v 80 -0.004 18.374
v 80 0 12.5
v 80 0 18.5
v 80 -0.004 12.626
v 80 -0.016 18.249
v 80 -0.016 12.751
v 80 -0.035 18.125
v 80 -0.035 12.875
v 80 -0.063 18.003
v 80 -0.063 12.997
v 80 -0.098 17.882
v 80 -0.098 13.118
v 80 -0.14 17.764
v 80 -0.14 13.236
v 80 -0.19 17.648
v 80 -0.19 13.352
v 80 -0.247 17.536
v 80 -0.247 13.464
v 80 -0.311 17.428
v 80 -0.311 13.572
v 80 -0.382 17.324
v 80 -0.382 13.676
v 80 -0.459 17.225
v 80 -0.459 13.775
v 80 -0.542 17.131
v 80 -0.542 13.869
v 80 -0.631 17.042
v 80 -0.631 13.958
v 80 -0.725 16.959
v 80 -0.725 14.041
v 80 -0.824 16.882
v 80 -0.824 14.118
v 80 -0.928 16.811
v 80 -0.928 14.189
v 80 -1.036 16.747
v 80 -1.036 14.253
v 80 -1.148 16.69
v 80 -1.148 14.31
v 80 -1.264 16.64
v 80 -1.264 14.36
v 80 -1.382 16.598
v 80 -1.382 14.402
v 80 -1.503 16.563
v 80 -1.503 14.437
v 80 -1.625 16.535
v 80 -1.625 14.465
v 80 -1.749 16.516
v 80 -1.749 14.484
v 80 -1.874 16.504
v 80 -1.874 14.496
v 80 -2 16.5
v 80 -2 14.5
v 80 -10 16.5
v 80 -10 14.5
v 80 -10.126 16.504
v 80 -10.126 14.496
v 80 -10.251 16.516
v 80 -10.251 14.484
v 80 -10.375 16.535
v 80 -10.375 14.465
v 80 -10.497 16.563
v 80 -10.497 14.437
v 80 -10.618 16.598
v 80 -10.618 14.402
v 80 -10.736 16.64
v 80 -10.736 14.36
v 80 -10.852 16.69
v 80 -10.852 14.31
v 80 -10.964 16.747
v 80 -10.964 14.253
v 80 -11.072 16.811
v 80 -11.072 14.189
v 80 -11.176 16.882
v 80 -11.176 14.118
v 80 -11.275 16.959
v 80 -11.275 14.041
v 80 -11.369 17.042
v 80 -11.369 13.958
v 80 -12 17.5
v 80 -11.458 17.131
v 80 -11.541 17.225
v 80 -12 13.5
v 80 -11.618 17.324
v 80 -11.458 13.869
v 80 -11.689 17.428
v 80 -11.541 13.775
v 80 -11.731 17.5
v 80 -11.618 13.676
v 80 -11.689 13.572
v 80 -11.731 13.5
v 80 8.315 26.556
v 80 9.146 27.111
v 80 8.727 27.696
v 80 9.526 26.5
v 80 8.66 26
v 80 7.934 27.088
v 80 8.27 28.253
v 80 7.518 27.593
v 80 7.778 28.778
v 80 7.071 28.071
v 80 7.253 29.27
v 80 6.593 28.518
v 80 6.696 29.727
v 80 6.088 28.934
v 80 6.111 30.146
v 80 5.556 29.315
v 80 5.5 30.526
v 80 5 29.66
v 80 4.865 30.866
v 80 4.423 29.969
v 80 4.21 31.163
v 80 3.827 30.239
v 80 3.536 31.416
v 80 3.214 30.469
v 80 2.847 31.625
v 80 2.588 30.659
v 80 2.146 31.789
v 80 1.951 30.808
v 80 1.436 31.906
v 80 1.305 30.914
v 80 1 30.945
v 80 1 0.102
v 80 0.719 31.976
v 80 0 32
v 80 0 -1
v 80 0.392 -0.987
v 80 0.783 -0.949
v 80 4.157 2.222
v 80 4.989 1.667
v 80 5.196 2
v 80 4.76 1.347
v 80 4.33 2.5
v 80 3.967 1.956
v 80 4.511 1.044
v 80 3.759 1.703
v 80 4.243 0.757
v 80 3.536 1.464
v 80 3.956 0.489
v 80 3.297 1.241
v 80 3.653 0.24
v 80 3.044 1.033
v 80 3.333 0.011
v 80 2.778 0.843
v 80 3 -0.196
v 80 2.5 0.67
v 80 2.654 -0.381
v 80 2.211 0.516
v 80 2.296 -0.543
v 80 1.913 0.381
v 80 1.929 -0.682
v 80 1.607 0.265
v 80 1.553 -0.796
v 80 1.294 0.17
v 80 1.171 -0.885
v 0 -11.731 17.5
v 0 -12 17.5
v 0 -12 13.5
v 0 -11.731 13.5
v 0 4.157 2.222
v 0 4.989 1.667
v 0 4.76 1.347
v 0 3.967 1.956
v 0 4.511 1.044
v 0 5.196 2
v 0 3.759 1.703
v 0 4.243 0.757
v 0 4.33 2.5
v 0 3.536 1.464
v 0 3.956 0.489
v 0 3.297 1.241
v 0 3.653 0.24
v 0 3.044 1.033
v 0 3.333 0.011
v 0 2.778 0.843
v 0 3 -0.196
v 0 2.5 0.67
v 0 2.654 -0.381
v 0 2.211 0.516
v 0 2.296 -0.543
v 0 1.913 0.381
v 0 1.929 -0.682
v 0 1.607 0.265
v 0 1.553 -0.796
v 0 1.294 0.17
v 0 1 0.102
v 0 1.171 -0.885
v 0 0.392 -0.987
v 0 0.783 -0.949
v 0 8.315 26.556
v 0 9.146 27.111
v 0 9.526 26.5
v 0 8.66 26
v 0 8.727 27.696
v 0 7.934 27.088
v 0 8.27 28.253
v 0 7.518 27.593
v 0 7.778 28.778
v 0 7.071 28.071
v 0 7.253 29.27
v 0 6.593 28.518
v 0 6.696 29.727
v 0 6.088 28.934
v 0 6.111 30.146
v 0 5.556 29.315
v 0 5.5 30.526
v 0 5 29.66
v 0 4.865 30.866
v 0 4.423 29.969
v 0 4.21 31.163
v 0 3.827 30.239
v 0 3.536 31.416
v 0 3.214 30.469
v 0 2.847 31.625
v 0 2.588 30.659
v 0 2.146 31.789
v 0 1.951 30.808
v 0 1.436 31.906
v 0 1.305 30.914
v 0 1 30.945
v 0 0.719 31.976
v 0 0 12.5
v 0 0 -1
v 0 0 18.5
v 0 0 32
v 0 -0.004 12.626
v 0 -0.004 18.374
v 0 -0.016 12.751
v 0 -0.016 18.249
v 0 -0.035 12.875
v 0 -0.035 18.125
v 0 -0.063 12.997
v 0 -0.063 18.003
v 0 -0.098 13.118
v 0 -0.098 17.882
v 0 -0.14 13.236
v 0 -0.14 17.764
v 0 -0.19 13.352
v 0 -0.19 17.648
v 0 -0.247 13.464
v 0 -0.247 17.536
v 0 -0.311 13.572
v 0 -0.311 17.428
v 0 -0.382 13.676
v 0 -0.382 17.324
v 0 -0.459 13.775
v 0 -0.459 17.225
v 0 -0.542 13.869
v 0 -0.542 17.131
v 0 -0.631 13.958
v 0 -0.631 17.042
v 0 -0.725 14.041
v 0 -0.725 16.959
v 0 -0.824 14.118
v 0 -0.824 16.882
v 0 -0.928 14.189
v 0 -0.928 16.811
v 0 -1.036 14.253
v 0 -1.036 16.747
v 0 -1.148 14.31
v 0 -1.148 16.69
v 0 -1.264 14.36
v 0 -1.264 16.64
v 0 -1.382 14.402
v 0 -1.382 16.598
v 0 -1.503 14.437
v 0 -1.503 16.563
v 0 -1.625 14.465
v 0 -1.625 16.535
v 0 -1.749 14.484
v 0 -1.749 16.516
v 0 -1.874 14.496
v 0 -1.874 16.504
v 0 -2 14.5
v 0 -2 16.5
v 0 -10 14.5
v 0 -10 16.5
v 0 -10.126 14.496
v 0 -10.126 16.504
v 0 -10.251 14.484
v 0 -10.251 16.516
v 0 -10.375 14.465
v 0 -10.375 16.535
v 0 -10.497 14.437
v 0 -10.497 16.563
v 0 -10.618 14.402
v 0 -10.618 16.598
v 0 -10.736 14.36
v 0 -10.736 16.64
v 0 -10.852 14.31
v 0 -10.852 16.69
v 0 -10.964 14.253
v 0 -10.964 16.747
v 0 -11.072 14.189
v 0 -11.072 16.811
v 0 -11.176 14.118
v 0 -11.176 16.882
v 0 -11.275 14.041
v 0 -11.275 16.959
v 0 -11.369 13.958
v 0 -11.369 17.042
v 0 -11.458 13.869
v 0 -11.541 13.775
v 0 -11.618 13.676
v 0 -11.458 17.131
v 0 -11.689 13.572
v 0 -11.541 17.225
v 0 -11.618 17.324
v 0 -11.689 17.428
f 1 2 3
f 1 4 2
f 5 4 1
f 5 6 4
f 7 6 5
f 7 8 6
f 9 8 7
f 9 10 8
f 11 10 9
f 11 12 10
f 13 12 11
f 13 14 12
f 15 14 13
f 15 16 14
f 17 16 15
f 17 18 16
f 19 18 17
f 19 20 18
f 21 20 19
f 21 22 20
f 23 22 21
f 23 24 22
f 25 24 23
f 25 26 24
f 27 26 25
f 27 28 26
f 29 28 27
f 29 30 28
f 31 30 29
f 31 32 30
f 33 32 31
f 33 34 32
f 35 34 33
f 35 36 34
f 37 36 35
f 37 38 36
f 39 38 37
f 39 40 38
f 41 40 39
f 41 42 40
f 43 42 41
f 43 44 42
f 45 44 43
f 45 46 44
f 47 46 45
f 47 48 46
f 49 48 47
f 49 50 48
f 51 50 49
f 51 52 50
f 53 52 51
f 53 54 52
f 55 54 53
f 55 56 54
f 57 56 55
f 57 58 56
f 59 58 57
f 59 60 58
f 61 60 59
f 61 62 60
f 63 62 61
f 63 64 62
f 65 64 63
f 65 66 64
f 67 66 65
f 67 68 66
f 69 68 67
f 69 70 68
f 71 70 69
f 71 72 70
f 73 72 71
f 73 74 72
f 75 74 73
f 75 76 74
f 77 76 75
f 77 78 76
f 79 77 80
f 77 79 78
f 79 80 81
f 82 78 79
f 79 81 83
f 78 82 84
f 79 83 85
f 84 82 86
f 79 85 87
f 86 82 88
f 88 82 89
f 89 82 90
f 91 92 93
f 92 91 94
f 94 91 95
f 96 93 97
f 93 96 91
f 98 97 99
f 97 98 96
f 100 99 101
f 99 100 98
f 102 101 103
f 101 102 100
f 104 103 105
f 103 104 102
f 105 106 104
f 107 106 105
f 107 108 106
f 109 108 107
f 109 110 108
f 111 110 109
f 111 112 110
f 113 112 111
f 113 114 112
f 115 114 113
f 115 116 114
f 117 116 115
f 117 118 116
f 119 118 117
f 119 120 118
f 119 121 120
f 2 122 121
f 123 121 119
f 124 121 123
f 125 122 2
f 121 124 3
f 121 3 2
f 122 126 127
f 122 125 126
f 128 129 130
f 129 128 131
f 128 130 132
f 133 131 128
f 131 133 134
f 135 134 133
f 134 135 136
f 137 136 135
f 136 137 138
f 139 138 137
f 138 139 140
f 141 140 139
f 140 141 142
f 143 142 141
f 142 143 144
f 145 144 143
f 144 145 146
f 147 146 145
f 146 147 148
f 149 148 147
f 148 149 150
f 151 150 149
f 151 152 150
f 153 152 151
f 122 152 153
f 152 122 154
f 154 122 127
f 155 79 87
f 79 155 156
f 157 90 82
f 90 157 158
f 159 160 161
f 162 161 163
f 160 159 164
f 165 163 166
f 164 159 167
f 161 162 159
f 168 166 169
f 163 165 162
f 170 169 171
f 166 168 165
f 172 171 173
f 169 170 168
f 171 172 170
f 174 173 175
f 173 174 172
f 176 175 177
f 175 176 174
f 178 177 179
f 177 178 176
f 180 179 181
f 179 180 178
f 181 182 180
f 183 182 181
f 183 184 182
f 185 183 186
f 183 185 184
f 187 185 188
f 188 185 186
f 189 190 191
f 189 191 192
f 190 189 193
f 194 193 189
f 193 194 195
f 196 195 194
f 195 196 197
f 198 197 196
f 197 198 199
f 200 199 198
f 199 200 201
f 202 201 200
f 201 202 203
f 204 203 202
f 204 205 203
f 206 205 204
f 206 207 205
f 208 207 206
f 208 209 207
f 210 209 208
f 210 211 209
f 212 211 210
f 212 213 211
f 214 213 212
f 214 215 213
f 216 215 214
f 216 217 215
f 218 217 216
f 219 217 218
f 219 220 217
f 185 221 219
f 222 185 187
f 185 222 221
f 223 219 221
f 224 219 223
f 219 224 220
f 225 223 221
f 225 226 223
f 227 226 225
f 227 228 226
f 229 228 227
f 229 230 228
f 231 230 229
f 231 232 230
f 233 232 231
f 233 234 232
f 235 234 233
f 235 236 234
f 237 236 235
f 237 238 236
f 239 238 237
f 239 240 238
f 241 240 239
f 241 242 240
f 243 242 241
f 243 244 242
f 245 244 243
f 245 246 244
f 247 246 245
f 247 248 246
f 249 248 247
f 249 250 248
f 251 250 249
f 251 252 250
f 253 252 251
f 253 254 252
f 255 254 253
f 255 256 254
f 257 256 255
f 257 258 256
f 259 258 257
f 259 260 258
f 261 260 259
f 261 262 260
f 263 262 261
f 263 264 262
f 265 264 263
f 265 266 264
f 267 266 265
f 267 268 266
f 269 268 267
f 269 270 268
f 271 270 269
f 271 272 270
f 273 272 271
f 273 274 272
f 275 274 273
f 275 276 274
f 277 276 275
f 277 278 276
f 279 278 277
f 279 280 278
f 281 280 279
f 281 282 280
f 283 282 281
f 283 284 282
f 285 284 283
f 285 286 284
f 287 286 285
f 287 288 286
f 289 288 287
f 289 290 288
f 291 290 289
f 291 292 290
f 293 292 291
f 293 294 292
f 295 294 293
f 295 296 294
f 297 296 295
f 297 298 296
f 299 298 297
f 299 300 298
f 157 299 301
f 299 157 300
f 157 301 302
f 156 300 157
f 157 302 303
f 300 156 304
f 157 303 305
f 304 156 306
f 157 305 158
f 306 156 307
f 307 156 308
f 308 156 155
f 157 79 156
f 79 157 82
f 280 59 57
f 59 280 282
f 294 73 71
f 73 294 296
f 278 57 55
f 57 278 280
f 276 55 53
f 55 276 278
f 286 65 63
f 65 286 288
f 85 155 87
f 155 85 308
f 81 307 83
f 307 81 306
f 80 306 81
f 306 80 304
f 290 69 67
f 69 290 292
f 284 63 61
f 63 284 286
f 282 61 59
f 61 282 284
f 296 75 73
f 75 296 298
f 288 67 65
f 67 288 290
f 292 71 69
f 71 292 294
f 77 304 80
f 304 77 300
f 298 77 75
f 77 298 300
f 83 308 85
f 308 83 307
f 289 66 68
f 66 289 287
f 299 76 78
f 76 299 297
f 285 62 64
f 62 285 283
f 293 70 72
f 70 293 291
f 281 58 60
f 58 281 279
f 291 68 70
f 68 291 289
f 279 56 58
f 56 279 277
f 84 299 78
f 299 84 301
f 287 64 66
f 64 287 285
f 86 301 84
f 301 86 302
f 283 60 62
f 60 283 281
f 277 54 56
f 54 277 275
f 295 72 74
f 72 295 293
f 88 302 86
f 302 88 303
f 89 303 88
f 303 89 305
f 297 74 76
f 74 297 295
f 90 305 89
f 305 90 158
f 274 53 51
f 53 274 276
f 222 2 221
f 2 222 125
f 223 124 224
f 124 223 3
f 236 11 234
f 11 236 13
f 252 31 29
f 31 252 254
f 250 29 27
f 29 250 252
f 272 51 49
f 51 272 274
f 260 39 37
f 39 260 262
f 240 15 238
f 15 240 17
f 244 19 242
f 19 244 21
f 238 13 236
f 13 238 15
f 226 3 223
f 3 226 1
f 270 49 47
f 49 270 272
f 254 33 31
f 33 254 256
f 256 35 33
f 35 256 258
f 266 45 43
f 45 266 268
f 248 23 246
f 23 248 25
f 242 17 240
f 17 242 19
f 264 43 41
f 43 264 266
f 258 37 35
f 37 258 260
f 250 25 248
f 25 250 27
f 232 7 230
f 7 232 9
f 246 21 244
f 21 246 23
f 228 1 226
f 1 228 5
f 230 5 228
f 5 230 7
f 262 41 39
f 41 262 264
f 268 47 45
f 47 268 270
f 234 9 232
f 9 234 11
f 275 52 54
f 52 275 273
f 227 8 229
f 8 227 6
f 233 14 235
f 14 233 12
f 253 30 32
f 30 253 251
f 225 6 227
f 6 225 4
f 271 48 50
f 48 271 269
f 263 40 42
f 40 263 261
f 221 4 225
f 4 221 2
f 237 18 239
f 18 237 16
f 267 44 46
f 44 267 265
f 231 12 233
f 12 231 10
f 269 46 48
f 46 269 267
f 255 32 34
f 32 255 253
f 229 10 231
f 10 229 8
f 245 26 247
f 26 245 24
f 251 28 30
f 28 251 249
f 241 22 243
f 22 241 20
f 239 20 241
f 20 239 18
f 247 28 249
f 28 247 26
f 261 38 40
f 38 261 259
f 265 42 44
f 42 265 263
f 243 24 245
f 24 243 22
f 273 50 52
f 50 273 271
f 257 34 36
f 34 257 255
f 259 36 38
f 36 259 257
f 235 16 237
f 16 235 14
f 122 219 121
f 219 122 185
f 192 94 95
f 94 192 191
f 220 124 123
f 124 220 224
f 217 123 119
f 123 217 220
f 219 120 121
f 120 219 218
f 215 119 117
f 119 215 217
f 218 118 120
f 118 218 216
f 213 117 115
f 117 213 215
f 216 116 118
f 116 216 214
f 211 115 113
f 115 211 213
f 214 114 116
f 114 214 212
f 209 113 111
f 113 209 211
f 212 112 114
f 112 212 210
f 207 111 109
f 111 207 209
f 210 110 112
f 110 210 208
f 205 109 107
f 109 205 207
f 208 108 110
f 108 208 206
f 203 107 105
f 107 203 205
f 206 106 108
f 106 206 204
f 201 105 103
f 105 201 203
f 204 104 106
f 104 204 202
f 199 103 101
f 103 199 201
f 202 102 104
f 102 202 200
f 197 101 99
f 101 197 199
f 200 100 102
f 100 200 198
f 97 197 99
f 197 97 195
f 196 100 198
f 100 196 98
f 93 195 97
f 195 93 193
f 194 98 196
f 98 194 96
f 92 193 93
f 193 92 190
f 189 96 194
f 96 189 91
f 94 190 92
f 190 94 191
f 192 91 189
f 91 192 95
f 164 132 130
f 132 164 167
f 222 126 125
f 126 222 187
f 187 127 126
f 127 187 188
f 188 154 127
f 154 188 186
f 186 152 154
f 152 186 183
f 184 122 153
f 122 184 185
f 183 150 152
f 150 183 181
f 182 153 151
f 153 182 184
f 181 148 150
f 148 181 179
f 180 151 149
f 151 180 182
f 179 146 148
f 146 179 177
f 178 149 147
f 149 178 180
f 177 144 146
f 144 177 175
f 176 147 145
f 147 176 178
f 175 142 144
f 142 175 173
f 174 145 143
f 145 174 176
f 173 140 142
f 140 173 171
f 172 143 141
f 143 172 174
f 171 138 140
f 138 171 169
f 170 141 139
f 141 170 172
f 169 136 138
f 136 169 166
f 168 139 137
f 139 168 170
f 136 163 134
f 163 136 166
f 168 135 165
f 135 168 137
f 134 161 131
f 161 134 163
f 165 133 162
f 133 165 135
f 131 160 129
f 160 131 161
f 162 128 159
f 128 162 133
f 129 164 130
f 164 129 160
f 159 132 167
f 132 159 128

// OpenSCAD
$fn = 100;

thickness = 1.0;
height = 31;
width = 80;

top_arch_radius = 10;
top_arch_extension_angle = 60;
bottom_arch_radius = 5;
bottom_arch_extension_angle = 60;

// Base plate
cube([width, thickness, height]);

// Upper grasp
translate([width, 0, -top_arch_radius + height])
    rotate([90, -90, -90])
        rotate_extrude(angle = top_arch_extension_angle)
            translate([top_arch_radius, 0, 0])
                square([thickness, width]);
                

// Lower grasp
translate([0, 0, bottom_arch_radius])
    rotate([90, 90, 90])
        rotate_extrude(angle = bottom_arch_extension_angle)
            translate([bottom_arch_radius, 0, 0])
                square([thickness, width]);

// Handle
handle_depth = 10;
handle_reinforcement_depth = 2;
handle_thickness = 2;

grip_depth = 2;
grip_height = 4;

// Extension
translate([0, -handle_depth, (height - handle_thickness) / 2])
    cube([width, handle_depth, handle_thickness]);
    
// Friction grip
translate([0, -handle_depth - grip_depth, (height - grip_height) / 2])
    difference() {
        cube([width, grip_depth, grip_height]);
        
        translate([0, grip_depth, grip_height / 2 + grip_depth + handle_thickness / 2])
            rotate([0, 90, 0])
                cylinder(h = width, r = grip_depth);
        
        translate([0, grip_depth, grip_height / 2 - grip_depth - handle_thickness / 2])
            rotate([0, 90, 0])
                cylinder(h = width, r = grip_depth);
    }
    
// Reinforcement
translate([0, -handle_reinforcement_depth, (height - handle_thickness) / 2 + handle_thickness])
    difference() {
        cube([width, handle_reinforcement_depth, handle_reinforcement_depth]);

        translate([0, 0, handle_reinforcement_depth])
            rotate([0, 90, 0])
                cylinder(h = width, r = handle_reinforcement_depth);
    }
    
translate([0, -handle_reinforcement_depth, (height - handle_thickness) / 2 - handle_thickness])
    difference() {
        cube([width, handle_reinforcement_depth, handle_reinforcement_depth]);
        
        translate([0, 0, 0])
            rotate([0, 90, 0])
                cylinder(h = width, r = handle_reinforcement_depth);
    }
